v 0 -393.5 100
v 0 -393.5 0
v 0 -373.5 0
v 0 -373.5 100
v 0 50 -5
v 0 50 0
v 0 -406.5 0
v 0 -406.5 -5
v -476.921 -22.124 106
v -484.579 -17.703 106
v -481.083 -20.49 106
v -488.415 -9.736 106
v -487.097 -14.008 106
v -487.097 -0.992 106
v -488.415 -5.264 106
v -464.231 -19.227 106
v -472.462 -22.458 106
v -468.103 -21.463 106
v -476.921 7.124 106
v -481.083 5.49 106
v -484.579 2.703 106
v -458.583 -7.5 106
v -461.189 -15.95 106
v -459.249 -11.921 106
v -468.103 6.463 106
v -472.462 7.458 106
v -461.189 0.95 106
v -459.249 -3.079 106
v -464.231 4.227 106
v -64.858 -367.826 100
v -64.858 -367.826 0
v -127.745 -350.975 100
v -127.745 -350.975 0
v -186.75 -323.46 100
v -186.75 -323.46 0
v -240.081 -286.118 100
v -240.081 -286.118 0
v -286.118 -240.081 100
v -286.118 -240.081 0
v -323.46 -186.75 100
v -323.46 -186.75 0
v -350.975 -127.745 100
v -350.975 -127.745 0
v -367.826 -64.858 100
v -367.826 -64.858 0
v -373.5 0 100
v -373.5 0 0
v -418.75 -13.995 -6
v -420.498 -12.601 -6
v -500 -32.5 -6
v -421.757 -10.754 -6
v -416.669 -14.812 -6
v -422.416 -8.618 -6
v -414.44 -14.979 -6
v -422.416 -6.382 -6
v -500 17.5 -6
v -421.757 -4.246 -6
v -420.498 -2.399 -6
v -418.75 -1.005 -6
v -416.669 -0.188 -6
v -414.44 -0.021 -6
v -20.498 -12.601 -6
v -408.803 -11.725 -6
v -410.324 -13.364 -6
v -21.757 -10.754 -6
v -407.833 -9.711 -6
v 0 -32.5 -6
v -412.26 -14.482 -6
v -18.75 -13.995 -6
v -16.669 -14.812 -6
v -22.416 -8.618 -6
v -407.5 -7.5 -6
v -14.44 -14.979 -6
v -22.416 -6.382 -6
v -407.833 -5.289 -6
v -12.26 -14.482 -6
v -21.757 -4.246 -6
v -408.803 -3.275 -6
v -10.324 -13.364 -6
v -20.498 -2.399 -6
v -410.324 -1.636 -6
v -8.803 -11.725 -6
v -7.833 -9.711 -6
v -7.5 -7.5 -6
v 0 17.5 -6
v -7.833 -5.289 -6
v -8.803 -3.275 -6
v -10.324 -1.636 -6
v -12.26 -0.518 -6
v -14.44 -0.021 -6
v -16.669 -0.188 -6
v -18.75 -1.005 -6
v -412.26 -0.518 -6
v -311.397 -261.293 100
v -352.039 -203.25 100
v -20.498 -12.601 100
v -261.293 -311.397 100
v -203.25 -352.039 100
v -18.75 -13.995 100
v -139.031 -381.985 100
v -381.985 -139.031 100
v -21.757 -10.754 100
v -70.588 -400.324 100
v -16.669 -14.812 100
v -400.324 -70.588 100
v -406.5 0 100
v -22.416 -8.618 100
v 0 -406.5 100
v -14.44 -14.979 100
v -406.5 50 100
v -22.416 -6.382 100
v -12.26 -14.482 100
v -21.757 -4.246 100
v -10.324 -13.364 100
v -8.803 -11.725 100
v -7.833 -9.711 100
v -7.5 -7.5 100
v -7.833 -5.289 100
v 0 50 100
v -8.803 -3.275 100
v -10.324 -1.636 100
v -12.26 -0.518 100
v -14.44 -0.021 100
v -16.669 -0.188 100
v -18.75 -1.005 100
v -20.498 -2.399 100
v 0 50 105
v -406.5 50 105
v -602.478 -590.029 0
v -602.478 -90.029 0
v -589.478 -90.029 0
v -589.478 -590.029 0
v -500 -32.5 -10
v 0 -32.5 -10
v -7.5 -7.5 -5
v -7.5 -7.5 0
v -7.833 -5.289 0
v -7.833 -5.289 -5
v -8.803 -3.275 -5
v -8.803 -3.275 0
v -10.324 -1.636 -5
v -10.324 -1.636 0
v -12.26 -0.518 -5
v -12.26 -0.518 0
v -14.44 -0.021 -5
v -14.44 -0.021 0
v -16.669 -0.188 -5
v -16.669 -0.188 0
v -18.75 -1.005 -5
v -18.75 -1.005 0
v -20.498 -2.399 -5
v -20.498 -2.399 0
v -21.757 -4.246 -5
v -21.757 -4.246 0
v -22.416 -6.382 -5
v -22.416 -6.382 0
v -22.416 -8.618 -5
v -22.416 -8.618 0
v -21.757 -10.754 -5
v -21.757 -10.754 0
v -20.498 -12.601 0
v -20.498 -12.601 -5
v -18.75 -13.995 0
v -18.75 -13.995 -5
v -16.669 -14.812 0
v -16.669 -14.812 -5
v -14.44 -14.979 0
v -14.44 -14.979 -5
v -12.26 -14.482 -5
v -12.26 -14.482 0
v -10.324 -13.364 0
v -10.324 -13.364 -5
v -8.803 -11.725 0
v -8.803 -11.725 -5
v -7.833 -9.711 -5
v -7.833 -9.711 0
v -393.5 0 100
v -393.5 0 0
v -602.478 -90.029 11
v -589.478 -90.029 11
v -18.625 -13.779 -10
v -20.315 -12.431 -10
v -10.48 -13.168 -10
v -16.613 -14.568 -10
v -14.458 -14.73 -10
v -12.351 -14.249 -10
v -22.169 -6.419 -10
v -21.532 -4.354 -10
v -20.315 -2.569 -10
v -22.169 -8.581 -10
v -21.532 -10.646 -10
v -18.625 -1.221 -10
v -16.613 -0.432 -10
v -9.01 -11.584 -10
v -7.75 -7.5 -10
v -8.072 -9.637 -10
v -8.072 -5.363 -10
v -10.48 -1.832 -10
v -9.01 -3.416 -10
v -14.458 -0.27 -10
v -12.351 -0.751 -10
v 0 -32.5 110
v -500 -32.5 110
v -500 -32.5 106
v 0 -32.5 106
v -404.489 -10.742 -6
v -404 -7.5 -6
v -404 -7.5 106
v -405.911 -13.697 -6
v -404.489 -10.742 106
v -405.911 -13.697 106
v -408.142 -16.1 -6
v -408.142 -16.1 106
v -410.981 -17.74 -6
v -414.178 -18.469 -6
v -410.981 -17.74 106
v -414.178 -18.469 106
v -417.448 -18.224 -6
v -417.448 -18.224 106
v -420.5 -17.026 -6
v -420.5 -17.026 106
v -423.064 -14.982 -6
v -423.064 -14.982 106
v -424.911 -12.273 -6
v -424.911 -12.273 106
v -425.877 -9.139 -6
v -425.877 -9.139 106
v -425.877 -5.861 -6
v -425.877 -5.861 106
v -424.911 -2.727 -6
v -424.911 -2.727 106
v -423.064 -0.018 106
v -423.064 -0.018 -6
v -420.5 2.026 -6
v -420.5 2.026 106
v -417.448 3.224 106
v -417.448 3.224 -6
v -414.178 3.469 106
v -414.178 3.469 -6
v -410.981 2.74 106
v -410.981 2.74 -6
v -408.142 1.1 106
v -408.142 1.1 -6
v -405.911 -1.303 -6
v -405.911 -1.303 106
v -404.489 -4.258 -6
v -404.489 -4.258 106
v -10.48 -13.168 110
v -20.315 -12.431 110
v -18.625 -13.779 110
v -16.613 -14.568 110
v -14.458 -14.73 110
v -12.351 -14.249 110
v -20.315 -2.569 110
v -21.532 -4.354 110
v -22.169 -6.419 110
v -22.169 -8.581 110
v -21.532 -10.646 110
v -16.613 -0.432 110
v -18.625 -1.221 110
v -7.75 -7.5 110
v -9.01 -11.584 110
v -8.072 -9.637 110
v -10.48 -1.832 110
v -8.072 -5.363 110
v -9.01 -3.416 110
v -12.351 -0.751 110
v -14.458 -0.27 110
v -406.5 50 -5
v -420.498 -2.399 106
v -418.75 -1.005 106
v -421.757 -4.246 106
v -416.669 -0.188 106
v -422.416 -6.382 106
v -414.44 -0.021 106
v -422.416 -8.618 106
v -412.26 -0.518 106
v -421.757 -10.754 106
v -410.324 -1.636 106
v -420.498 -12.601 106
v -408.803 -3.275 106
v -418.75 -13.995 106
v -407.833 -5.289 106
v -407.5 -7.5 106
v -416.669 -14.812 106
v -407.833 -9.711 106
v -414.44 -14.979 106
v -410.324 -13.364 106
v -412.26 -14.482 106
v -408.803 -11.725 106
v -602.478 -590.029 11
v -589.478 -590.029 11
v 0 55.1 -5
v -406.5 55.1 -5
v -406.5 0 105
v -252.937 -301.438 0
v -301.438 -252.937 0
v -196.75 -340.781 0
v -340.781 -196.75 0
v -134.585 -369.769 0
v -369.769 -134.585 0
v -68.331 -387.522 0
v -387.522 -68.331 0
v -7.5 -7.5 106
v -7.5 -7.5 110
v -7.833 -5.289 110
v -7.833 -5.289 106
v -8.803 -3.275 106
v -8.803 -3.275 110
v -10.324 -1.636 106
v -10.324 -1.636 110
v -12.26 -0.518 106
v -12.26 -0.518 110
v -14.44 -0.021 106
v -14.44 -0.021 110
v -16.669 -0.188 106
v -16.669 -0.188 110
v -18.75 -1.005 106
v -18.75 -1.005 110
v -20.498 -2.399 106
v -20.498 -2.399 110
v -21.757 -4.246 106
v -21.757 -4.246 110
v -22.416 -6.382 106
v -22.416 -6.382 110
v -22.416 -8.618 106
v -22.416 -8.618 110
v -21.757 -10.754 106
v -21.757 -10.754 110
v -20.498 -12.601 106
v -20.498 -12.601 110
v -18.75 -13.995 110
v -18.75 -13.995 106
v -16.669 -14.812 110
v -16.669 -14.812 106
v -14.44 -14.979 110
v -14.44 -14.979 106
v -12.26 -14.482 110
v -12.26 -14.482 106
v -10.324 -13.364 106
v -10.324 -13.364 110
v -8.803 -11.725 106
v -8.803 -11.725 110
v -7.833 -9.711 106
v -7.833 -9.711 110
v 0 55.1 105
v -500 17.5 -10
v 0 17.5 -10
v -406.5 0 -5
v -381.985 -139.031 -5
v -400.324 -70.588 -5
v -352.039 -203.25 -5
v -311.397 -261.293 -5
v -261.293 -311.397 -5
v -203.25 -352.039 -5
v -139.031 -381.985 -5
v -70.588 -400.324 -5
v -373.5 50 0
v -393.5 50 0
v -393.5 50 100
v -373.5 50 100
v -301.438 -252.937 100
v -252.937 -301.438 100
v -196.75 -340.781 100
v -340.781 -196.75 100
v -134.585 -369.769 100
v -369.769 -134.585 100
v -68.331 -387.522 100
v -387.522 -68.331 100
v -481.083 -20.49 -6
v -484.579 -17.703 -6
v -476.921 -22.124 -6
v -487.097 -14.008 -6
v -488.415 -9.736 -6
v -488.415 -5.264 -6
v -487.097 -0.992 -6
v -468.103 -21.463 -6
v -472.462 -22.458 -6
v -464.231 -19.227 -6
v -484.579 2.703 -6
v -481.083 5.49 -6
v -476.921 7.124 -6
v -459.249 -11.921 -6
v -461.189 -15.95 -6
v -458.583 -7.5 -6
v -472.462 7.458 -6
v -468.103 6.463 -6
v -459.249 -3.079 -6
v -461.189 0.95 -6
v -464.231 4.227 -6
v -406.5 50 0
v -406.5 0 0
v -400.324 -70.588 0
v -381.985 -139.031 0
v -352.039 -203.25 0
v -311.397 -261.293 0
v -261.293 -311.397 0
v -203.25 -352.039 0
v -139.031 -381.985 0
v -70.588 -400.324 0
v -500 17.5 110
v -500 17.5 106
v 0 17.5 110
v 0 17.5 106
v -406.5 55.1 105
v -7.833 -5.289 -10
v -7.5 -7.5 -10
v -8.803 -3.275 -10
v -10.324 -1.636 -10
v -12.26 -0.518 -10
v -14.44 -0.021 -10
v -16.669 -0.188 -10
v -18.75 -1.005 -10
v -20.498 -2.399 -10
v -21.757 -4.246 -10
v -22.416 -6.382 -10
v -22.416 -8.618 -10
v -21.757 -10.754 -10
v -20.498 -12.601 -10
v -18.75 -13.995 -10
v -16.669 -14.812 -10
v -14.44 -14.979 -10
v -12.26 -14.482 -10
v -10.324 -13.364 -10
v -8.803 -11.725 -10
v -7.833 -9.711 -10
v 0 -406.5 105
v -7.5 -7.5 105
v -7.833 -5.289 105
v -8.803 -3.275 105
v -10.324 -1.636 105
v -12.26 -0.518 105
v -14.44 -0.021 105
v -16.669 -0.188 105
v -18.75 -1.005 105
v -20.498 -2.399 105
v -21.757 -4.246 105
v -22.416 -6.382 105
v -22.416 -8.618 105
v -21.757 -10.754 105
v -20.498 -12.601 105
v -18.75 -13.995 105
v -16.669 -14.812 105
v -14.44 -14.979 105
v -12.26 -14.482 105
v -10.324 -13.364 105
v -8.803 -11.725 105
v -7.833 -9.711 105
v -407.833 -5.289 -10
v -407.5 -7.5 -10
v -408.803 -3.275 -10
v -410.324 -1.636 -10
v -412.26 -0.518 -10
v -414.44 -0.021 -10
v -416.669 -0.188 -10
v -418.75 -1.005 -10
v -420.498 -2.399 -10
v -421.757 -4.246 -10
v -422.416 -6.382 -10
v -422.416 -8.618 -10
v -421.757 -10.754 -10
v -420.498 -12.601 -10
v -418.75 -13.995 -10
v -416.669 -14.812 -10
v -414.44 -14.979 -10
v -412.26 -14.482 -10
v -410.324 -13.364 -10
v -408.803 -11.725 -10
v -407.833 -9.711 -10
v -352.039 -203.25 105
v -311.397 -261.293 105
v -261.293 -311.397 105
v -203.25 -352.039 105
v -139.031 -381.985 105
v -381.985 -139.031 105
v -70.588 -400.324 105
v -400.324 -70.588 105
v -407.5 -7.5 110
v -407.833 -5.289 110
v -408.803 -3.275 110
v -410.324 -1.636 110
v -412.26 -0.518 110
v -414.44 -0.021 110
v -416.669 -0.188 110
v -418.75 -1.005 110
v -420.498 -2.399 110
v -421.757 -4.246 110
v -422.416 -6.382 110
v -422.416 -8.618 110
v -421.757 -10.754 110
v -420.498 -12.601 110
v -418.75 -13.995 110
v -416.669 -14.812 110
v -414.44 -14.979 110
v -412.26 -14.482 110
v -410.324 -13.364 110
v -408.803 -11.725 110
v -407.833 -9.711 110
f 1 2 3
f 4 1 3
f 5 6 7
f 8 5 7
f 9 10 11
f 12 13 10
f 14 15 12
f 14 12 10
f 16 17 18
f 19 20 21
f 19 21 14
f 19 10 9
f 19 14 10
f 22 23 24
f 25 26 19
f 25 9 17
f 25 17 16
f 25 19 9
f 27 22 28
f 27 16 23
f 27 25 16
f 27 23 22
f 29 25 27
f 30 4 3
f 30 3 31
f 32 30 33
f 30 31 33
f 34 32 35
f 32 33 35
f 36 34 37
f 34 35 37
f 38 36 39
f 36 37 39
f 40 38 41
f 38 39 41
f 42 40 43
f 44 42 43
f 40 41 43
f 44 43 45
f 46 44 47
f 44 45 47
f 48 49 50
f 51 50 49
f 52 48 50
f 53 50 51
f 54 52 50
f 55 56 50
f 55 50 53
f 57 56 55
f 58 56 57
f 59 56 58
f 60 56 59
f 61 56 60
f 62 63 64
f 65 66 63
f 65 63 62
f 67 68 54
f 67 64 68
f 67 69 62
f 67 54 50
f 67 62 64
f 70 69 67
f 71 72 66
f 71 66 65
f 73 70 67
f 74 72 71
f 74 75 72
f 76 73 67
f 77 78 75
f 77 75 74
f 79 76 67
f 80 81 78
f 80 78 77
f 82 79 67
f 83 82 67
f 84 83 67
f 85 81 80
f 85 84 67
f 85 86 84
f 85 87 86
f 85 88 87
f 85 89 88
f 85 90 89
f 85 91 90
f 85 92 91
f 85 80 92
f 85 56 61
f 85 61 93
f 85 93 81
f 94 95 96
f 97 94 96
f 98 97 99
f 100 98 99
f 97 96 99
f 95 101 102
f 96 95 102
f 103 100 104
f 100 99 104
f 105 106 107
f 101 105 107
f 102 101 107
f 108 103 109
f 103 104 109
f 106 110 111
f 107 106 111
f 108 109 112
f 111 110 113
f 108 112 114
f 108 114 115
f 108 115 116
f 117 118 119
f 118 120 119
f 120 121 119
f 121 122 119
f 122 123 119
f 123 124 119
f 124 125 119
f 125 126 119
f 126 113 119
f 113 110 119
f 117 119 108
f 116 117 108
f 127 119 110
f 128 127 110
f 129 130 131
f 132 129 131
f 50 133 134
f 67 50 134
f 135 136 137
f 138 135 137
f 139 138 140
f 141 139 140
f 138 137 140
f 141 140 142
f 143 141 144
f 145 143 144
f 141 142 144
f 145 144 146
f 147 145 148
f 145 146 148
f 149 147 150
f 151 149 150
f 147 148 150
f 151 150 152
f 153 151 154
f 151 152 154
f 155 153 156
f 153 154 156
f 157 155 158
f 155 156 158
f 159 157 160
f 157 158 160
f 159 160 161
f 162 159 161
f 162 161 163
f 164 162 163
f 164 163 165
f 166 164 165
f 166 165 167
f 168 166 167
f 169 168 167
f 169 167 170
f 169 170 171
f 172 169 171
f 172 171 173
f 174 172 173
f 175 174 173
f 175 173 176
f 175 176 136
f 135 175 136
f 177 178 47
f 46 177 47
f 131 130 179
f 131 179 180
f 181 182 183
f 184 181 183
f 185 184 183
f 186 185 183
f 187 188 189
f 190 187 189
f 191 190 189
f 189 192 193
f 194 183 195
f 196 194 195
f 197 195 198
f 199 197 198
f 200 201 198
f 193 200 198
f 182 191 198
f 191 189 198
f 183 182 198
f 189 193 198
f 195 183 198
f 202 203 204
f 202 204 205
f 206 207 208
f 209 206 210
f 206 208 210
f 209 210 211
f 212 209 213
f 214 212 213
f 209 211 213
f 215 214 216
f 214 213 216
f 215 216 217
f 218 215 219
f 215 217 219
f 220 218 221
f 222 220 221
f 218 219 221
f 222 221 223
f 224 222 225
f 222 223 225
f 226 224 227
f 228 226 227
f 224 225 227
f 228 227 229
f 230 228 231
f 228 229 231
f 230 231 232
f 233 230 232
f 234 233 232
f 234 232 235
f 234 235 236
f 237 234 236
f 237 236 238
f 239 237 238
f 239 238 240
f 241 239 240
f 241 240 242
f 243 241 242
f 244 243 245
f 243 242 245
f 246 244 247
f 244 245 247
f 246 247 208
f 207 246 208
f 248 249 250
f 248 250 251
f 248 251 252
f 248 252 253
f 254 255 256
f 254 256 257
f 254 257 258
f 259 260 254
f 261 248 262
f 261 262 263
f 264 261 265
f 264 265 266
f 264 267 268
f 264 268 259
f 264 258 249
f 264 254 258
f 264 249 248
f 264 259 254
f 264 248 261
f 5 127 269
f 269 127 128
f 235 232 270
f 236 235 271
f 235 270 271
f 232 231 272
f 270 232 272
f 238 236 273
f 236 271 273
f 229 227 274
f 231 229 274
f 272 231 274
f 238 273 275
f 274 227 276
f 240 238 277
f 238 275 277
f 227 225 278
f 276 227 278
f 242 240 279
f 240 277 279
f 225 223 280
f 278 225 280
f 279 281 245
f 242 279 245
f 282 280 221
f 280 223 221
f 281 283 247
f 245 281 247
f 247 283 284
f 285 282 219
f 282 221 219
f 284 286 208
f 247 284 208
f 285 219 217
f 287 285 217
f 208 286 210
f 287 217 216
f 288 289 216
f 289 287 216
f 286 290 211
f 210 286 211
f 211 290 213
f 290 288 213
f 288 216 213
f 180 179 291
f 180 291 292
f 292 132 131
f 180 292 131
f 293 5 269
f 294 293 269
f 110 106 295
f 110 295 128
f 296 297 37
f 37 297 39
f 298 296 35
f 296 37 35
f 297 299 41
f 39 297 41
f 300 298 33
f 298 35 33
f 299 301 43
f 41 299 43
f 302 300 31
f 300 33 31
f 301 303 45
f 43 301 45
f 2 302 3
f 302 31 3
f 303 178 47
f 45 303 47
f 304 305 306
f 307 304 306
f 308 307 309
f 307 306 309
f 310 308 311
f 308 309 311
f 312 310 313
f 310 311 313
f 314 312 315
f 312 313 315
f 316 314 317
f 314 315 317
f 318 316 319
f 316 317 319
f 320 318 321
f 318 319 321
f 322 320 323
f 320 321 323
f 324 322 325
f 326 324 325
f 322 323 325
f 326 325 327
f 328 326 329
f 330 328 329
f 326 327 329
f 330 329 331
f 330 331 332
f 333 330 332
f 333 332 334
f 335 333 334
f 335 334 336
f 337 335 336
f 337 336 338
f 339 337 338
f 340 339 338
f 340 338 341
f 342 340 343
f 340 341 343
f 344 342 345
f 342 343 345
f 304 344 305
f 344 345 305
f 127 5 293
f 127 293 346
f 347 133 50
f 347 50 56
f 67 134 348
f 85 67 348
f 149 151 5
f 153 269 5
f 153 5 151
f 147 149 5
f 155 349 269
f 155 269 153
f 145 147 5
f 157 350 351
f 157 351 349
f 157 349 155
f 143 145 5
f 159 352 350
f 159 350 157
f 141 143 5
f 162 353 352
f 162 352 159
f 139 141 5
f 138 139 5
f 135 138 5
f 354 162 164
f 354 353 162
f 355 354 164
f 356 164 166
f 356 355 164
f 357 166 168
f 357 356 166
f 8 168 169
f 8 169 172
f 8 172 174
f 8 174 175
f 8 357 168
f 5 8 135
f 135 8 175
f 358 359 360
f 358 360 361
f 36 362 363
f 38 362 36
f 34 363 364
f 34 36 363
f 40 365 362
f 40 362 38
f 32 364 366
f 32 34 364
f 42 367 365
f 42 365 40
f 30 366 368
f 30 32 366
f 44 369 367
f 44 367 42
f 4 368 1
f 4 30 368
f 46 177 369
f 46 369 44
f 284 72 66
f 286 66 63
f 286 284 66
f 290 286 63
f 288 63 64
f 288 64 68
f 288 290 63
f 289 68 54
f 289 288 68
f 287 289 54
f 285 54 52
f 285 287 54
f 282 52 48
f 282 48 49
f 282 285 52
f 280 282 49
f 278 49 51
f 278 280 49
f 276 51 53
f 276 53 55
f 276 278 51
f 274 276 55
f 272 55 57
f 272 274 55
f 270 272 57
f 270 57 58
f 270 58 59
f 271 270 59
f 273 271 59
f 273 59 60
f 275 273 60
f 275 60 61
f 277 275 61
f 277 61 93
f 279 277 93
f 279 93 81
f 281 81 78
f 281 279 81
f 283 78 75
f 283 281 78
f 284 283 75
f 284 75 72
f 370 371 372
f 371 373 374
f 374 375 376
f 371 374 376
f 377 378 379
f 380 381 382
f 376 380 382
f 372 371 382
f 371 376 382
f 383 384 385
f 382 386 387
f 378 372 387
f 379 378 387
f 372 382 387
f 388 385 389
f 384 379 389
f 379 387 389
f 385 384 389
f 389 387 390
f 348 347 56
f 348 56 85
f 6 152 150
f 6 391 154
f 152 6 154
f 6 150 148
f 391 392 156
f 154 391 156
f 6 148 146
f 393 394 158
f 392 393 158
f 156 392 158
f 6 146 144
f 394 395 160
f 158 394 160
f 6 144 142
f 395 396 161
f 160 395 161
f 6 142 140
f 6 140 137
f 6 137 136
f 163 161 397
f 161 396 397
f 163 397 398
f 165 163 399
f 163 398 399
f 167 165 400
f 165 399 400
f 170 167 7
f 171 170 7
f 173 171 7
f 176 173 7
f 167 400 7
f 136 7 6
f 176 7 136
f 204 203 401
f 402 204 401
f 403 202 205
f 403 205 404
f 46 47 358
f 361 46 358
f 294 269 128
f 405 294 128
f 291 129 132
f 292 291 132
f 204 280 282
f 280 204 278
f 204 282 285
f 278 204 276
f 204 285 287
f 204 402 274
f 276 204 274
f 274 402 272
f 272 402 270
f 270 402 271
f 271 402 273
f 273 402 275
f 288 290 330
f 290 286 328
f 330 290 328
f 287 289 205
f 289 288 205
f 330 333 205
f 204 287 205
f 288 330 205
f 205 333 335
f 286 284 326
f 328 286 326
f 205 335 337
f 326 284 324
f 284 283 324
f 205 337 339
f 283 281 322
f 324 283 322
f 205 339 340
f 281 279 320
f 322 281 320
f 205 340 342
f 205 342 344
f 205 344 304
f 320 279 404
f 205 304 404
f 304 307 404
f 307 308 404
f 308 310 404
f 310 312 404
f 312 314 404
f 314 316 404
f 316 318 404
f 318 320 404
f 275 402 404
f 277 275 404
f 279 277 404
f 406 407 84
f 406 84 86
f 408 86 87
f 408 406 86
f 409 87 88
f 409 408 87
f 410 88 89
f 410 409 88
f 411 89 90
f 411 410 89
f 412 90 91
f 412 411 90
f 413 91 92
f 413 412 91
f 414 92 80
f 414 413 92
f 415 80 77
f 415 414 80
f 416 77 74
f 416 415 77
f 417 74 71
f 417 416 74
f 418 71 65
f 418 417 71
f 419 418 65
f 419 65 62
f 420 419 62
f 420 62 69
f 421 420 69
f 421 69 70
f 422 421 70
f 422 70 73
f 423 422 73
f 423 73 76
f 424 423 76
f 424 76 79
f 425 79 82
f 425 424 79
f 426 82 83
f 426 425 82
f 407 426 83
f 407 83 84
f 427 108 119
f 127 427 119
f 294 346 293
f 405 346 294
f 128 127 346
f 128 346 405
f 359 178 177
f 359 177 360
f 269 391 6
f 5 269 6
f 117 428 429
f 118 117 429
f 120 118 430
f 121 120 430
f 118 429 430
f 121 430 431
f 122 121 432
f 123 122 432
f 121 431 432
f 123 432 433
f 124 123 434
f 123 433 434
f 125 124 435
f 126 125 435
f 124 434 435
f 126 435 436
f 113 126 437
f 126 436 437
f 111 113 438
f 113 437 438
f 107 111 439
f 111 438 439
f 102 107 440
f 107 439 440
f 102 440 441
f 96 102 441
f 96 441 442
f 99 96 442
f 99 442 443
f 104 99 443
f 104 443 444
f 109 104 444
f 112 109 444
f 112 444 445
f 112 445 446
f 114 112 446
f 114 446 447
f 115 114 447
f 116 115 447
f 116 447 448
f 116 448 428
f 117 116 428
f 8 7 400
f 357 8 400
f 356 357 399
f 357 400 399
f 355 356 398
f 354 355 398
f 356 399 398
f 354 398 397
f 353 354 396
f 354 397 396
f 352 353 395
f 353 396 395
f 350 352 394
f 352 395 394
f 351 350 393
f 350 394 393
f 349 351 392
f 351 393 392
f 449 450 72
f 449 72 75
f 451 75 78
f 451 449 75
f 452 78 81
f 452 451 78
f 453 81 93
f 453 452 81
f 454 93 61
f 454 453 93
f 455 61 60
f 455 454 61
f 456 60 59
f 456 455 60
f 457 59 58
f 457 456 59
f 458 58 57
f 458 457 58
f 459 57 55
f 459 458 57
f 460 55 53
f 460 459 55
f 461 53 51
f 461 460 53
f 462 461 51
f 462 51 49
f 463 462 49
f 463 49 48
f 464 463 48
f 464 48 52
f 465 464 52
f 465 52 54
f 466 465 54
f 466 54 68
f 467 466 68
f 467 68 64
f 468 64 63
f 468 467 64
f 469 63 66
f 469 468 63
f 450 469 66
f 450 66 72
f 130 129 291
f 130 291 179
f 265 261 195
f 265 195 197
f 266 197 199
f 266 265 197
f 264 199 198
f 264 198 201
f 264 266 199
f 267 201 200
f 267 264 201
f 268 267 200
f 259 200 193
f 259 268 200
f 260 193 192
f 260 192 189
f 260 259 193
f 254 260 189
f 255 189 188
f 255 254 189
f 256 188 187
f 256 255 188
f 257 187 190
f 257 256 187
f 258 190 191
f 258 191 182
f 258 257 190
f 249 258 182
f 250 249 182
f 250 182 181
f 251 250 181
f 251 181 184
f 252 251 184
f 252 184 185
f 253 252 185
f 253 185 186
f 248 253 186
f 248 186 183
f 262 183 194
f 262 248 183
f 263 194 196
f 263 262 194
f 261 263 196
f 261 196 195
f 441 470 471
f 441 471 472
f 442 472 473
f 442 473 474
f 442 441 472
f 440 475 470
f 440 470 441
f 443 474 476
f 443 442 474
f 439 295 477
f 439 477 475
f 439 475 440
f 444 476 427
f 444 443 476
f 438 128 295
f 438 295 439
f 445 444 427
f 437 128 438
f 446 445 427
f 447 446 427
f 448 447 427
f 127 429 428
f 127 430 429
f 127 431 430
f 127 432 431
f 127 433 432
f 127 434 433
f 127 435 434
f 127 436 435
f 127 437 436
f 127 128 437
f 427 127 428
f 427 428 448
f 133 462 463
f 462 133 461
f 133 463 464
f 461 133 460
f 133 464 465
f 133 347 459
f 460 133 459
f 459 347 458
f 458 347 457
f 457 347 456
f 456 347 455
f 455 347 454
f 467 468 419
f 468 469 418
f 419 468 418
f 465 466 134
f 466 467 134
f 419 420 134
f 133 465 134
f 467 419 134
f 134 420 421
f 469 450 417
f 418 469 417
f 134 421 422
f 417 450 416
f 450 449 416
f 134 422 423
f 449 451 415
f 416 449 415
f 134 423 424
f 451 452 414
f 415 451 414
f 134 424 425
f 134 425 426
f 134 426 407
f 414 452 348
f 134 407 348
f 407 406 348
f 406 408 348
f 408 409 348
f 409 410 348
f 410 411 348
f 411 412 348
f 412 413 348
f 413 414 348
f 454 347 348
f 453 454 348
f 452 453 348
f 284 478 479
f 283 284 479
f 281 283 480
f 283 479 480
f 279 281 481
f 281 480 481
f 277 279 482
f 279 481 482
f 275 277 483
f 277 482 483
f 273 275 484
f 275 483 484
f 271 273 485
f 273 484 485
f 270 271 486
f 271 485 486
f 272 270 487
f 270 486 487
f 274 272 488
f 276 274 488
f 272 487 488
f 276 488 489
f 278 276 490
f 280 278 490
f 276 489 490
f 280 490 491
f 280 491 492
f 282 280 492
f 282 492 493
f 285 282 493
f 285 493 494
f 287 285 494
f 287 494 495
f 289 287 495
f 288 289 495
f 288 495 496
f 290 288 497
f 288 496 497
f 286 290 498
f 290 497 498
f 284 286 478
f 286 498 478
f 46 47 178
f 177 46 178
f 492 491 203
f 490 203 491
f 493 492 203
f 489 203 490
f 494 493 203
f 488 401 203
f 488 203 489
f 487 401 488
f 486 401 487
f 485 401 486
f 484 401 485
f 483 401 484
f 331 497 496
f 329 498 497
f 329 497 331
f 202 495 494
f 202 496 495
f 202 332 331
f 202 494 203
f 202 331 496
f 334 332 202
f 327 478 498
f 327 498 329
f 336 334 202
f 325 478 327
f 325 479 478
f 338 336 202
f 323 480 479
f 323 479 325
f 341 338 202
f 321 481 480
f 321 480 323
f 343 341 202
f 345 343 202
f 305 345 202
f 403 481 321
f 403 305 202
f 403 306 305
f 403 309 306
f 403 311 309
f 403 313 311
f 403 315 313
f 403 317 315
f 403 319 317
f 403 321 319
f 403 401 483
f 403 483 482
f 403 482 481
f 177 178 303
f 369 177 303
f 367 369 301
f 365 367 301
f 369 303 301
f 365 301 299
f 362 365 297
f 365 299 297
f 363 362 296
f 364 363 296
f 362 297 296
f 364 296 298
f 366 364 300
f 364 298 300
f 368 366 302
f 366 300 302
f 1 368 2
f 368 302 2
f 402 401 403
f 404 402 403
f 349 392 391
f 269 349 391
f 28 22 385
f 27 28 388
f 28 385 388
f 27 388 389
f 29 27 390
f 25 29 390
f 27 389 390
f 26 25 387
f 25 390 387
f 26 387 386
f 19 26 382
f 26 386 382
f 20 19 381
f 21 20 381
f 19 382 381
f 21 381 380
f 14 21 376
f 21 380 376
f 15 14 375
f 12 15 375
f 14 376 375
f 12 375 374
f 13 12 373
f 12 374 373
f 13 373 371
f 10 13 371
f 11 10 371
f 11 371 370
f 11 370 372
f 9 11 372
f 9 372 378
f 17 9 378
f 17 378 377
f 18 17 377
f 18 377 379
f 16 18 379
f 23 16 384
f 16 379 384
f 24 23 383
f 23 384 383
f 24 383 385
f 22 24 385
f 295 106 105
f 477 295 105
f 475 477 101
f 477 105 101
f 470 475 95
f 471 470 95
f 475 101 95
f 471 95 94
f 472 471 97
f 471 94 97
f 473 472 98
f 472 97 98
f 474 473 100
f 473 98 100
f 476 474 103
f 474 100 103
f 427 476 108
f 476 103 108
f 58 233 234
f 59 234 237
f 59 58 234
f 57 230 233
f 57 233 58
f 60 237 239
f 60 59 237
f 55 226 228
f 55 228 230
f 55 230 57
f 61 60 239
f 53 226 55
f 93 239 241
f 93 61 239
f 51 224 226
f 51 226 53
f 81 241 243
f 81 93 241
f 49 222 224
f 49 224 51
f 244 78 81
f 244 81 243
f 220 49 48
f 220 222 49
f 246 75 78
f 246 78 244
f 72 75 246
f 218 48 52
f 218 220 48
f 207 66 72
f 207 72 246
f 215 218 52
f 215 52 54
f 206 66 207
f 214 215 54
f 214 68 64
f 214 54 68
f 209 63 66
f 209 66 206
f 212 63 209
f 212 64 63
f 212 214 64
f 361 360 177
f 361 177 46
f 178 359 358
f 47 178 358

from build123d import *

# Parameters (mm, degrees)
F1_DEPTH  = 100
F4_DEPTH  = 5
F6_W      = 393.5
F6_H      = 50
F6_W_2    = 13
F7_DEPTH  = 5
F9_W      = 406.5
F9_H      = 110
F10_DEPTH = 5.1
F11_R     = 7.5
F12_DEPTH = 110.001
F14_R     = 7.25
F15_DEPTH = 120
F17_W     = 500
F17_H     = 50
F17_R     = 7.5
F18_DEPTH = 4
F0_W      = 20
F0_H      = 50
F21_DEPTH = 100
F22_R     = 15
F23_DEPTH = 112
F24_R     = 11
F24_R_2   = 7.5
F25_DEPTH = 112
F26_W     = 13
F26_H     = 500
F27_DEPTH = 11


# Not quite as in the source:
# - a feature names something its author has since deleted; it is built from what else it names


with BuildPart() as f1:
    # F0 (on Top) → F1 (new body)
    with BuildSketch(Plane.XY):
        with BuildLine():
            ThreePointArc((0, -373.5), (-264.1043827732, -264.1043827732), (-373.5, 0))
            Line((-373.5, 0), (-393.5, 0))
            ThreePointArc((-393.5, 0), (-278.2465183969, -278.2465183969), (0, -393.5))
            Line((0, -393.5), (0, -373.5))
        make_face()
    extrude(amount=F1_DEPTH)


with BuildPart() as f4:
    # F3 (on offset) → F4 (new body)
    with BuildSketch(Plane(origin=(0, 0, 0), x_dir=(1, 0, 0), z_dir=(0, 0, -1))):
        with BuildLine():
            Line((-393.5, 0), (0, 0))
            Line((0, 0), (0, 393.5))
            ThreePointArc((0, 393.5), (-278.2465183969, 278.2465183969), (-393.5, 0))
        make_face()
        Polygon((0, -50), (0, 0), (-393.5, 0), (-406.5, 0), (-406.5, -50), align=None)
        with BuildLine():
            ThreePointArc((-393.5, 0), (-278.2465183969, 278.2465183969), (0, 393.5))
            Line((0, 393.5), (0, 406.5))
            ThreePointArc((0, 406.5), (-287.4389065523, 287.4389065523), (-406.5, 0))
            Line((-406.5, 0), (-393.5, 0))
        make_face()
    extrude(amount=F4_DEPTH)


with BuildPart() as f7:
    # F6 (on offset) → F7 (new body)
    with BuildSketch(Plane.XY.offset(100)):
        with BuildLine():
            Line((0, -393.5), (0, 0))
            Line((0, 0), (-393.5, 0))
            ThreePointArc((-393.5, 0), (-278.2465183969, -278.2465183969), (0, -393.5))
        make_face()
        with Locations((-196.75, 25)):
            Rectangle(F6_W, F6_H)
        with BuildLine():
            Line((0, -406.5), (0, -393.5))
            ThreePointArc((0, -393.5), (-278.2465183969, -278.2465183969), (-393.5, 0))
            Line((-393.5, 0), (-406.5, 0))
            ThreePointArc((-406.5, 0), (-287.4389065523, -287.4389065523), (0, -406.5))
        make_face()
        with Locations((-400, 25)):
            Rectangle(F6_W_2, F6_H)
    extrude(amount=F7_DEPTH)


with BuildPart() as f10:
    # F9 (on offset) → F10 (new body)
    with BuildSketch(Plane(origin=(0, 50, 0), x_dir=(-1, 0, 0), z_dir=(0, 1, 0))):
        with Locations((203.25, 50)):
            Rectangle(F9_W, F9_H)
    extrude(amount=F10_DEPTH)


with BuildPart() as f12_tool:
    # F11 (on face) → F12 (new body, through all)
    with BuildSketch(Plane.XY.offset(105)):
        with Locations((-15, -7.5)):
            Circle(F11_R)
    extrude(amount=-F12_DEPTH)


with BuildPart() as f4_1:
    add(f4.part)

    # F12: cut by f12_tool
    add(f12_tool.part, mode=Mode.SUBTRACT)


with BuildPart() as f7_1:
    add(f7.part)

    # F12: cut by f12_tool
    add(f12_tool.part, mode=Mode.SUBTRACT)


with BuildPart() as f15:
    # F14 (on offset) → F15 (new body)
    with BuildSketch(Plane.XY.offset(110)):
        with Locations((-15, -7.5)):
            Circle(F14_R)
    extrude(amount=-F15_DEPTH)


with BuildPart() as f18:
    # F17 (on offset) → F18 (new body)
    with BuildSketch(Plane.XY.offset(110)):
        with Locations((-250, -7.5)):
            Rectangle(F17_W, F17_H)
        with Locations((-415, -7.5)):
            Circle(F17_R, mode=Mode.SUBTRACT)
        with Locations((-15, -7.5)):
            Circle(F17_R, mode=Mode.SUBTRACT)
    extrude(amount=-F18_DEPTH)


with BuildPart() as f20_1:
    # F20: instance of F18
    add(f18.part.mirror(Plane(origin=(-244.1990168857, -244.1990168857, 50), x_dir=(1, 0, 0), z_dir=(0, 0, 1))))


with BuildPart() as f21:
    # F0 (on Top) → F21 (new body)
    with BuildSketch(Plane.XY):
        with Locations((-383.5, 25)):
            Rectangle(F0_W, F0_H)
    extrude(amount=F21_DEPTH)


with BuildPart() as f23:
    # F22 (on face) → F23 (new body, through all)
    with BuildSketch(Plane.XY.offset(-6)):
        with Locations((-473.5828638077, -7.5)):
            Circle(F22_R)
    extrude(amount=F23_DEPTH)


with BuildPart() as f25:
    # F24 (on face) → F25 (new body, through all)
    with BuildSketch(Plane(origin=(0, 0, 106), x_dir=(1, 0, 0), z_dir=(0, 0, -1))):
        with Locations((-415, 7.5)):
            Circle(F24_R)
        with Locations((-415, 7.5)):
            Circle(F24_R_2, mode=Mode.SUBTRACT)
    extrude(amount=F25_DEPTH)


with BuildPart() as f27:
    # F26 (on Top) → F27 (new body)
    with BuildSketch(Plane.XY):
        with Locations((-595.9782657623, -340.0288820267)):
            Rectangle(F26_W, F26_H)
    extrude(amount=F27_DEPTH)


solid = Compound([f1.part, f10.part, f4_1.part, f7_1.part, f15.part, f18.part, f20_1.part, f21.part, f23.part, f25.part, f27.part])
